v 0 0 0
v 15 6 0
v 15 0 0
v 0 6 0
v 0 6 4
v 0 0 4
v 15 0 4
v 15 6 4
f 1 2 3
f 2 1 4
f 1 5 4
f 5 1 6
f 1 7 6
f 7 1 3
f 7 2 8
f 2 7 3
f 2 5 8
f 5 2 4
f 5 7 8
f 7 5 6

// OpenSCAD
translate([2.5, 1.5, 1.0]) color([0.825263298673666, 0.4194232417620346, 0.27521081604483055]) cube([5, 3, 2], center=true);
translate([7.5, 1.5, 1.0]) color([0.492655386479537, 0.6411968245823519, 0.7002255239854843]) cube([5, 3, 2], center=true);
translate([12.5, 1.5, 1.0]) color([0.9824603855112574, 0.35736754598001375, 0.3243248433827095]) cube([5, 3, 2], center=true);
translate([2.5, 4.5, 1.0]) color([0.11534974341425441, 0.5870747017126332, 0.3352704781672178]) cube([5, 3, 2], center=true);
translate([7.5, 4.5, 1.0]) color([0.19037884654876303, 0.016209026660689796, 0.27103795943509257]) cube([5, 3, 2], center=true);
translate([12.5, 4.5, 1.0]) color([0.7053331153129081, 0.3720601930810732, 0.170481773708285]) cube([5, 3, 2], center=true);
translate([7.5, 3.0, 3.0]) color([0.4261311353438578, 0.06219245568370457, 0.7831185098466164]) cube([15, 6, 2], center=true);
